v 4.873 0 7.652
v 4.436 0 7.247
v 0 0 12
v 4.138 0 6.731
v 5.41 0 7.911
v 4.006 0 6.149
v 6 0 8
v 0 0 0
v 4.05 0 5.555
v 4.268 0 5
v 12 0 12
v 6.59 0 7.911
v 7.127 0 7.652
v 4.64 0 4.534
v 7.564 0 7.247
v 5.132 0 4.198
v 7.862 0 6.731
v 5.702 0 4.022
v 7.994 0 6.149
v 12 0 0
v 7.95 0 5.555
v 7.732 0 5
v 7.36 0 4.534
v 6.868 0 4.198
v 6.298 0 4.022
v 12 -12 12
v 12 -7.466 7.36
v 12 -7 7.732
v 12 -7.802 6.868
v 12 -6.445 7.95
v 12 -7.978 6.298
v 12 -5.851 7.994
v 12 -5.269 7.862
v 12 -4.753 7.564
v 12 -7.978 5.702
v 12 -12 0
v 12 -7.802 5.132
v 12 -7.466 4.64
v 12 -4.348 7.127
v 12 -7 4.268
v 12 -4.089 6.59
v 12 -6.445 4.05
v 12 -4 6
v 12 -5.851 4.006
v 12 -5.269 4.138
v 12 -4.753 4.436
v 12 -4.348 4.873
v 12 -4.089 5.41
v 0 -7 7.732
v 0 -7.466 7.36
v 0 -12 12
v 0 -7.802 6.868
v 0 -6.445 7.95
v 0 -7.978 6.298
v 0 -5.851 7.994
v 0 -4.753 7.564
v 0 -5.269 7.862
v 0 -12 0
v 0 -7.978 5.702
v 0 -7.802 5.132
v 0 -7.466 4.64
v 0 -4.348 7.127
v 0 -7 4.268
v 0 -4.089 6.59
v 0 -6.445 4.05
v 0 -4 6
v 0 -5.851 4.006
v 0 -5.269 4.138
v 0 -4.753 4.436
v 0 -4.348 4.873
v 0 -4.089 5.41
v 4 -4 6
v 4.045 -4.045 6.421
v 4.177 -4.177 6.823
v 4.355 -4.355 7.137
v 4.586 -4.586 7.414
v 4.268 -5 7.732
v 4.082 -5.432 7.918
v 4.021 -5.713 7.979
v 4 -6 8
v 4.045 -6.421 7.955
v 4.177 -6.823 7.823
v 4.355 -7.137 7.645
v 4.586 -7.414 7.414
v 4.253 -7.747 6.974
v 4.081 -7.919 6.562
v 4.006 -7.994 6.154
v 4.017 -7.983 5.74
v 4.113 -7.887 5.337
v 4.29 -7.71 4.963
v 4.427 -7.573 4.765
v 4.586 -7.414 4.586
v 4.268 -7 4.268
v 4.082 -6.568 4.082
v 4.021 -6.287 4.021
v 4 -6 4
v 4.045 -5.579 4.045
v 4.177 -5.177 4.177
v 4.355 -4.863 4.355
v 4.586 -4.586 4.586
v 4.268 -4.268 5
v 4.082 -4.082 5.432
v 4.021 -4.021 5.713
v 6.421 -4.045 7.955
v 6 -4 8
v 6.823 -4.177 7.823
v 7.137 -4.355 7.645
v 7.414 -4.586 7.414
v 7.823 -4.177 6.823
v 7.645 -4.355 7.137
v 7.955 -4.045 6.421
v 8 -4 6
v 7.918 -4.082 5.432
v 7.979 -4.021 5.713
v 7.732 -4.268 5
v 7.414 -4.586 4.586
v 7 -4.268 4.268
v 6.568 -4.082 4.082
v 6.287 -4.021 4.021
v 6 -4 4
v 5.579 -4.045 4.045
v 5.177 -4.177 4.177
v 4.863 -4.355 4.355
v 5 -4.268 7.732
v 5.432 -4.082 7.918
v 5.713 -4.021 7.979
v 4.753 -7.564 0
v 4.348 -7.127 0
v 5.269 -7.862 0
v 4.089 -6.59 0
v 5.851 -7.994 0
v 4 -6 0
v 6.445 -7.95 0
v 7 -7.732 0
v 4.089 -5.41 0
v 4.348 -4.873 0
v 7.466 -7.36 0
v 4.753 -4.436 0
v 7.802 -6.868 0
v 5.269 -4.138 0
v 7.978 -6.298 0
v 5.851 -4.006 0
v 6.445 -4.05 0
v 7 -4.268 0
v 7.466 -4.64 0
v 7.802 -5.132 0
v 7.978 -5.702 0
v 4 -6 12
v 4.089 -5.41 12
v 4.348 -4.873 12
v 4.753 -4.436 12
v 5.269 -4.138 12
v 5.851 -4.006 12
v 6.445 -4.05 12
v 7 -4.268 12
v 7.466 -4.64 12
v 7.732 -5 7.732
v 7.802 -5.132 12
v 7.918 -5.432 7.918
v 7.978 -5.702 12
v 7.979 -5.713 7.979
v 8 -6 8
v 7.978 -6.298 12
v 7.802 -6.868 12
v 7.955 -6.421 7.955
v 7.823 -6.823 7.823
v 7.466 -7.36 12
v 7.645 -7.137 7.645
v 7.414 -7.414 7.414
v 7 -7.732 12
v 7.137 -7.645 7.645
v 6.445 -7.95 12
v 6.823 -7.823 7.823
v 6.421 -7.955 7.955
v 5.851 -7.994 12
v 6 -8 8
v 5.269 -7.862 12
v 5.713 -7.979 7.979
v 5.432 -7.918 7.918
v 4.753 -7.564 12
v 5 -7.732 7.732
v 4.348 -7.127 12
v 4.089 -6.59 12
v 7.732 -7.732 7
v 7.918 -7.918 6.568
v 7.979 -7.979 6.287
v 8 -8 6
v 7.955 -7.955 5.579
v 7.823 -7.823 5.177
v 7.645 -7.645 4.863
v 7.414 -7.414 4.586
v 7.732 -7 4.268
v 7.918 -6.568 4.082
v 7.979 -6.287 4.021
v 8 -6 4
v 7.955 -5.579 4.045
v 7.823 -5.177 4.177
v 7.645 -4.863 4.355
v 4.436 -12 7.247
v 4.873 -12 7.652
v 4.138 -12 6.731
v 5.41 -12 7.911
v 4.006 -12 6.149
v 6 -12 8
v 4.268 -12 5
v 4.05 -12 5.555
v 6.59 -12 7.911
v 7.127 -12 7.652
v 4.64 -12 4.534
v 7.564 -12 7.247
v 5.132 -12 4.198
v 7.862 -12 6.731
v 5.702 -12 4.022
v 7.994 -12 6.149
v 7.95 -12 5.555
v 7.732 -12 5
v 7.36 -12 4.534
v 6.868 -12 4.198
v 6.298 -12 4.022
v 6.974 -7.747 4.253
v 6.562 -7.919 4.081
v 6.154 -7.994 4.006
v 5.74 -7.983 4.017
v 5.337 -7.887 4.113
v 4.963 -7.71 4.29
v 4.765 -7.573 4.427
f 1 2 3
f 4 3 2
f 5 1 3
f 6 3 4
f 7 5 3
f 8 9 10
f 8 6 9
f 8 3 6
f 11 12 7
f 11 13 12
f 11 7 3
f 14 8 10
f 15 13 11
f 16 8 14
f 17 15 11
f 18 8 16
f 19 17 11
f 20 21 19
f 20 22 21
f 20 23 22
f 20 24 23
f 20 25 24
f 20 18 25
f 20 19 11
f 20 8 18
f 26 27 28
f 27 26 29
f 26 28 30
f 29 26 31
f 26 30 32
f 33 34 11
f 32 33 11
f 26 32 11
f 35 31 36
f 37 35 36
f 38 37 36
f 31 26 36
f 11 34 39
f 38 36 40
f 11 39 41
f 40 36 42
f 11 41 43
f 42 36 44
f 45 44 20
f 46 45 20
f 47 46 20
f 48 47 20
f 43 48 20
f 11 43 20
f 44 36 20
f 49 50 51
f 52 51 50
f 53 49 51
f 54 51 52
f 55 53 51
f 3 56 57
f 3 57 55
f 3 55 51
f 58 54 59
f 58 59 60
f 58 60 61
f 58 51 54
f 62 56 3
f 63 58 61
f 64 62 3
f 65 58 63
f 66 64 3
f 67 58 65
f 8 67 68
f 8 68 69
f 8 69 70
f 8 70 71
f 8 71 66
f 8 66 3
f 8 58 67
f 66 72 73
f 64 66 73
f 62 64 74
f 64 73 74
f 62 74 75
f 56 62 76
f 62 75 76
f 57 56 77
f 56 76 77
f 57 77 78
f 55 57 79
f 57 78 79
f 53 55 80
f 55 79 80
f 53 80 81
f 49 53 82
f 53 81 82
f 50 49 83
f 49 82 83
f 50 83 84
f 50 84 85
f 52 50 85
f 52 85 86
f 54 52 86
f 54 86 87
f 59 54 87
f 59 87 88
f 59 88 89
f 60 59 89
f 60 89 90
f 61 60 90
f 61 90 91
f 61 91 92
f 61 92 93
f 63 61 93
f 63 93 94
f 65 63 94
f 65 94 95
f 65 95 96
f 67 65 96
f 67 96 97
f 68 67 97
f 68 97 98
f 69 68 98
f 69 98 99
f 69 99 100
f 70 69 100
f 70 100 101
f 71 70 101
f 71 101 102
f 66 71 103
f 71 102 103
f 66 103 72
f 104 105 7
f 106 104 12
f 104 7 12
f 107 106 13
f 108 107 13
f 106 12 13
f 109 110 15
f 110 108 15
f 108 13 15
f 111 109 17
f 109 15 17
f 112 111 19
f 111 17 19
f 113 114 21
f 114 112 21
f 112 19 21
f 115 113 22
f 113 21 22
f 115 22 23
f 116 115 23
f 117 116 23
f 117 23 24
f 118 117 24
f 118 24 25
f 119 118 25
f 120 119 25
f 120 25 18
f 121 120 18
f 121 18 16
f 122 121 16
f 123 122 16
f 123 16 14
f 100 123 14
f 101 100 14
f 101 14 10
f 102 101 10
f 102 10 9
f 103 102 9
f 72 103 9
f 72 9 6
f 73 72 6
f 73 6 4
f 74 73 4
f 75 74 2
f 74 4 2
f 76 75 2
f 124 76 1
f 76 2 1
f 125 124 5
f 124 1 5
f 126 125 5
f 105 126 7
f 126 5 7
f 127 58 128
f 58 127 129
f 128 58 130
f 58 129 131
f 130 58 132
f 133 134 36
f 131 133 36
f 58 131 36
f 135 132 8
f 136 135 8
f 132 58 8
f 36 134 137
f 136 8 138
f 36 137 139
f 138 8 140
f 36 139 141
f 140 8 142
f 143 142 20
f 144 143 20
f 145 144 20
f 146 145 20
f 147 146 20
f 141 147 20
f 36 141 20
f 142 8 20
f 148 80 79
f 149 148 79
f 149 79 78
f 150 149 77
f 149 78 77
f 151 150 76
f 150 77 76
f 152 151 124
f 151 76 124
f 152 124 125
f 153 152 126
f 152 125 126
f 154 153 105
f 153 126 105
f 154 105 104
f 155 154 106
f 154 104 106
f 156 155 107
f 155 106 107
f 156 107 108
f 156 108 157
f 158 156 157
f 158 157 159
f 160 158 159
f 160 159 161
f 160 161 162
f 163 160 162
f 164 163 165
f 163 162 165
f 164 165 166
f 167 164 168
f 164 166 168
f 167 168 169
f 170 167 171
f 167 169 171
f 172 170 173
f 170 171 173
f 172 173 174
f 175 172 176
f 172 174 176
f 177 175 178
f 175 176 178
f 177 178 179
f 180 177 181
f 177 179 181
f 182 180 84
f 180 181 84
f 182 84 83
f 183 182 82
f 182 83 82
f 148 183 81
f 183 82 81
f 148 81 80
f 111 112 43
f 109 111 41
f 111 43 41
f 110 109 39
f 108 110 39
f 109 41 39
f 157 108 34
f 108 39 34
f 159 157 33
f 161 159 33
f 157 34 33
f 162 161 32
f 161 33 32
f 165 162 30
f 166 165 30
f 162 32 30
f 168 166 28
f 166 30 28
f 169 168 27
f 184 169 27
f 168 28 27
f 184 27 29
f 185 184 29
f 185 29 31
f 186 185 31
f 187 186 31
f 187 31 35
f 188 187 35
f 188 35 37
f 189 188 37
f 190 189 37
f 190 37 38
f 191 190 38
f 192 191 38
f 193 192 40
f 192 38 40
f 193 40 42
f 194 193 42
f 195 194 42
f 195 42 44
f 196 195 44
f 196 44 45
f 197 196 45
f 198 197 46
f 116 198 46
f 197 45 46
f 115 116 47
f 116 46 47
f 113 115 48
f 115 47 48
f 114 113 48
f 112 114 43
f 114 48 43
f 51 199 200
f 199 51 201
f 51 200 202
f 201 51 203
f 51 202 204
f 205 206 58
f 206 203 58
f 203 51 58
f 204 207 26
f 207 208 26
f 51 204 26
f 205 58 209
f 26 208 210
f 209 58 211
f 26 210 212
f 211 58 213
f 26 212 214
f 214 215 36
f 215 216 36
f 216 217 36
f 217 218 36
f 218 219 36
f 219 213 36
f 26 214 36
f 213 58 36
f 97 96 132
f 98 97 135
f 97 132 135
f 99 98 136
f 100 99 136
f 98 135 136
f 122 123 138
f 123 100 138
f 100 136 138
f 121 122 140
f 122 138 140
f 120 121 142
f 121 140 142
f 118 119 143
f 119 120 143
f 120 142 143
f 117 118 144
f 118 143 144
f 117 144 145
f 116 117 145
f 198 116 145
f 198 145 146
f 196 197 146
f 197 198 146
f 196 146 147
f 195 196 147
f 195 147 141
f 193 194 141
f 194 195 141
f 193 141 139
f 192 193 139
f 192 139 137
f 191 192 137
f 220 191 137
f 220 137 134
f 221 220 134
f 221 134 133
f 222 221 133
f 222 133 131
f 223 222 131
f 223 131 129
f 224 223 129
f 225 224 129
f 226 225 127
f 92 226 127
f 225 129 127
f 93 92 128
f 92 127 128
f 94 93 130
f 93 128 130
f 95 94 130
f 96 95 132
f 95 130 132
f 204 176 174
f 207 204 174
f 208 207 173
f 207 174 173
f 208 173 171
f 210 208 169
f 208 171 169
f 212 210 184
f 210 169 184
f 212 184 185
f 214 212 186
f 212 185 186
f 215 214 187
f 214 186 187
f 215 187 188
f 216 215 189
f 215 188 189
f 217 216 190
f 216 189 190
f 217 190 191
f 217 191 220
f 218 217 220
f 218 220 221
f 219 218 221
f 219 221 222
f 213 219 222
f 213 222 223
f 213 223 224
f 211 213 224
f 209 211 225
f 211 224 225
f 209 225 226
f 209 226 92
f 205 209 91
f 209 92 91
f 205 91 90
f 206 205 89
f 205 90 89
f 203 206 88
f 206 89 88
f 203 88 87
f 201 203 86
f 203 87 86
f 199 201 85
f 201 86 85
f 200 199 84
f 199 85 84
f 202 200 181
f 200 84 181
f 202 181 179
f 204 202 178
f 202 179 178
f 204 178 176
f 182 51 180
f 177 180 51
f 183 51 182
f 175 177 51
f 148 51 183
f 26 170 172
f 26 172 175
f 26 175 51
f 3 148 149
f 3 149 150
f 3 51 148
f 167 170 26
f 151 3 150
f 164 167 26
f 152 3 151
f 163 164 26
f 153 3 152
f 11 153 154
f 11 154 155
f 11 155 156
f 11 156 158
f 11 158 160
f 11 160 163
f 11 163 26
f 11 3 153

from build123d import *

# Parameters (mm, degrees)
SKETCH_1_W          = 12
SKETCH_1_H          = 12
EXTRUDE_1_DEPTH     = 12
SKETCH_2_R          = 2
CUT_EXTRUDE_1_DEPTH = 21.784609691
SKETCH_3_R          = 2
CUT_EXTRUDE_2_DEPTH = 21.784609691
SKETCH_4_R          = 2
CUT_EXTRUDE_3_DEPTH = 21.784609691


with BuildPart() as part:
    # 草图1 → 凸台-拉伸1 (new body)
    with BuildSketch(Plane.XY):
        with Locations((6, -6)):
            Rectangle(SKETCH_1_W, SKETCH_1_H)
    extrude(amount=EXTRUDE_1_DEPTH)

    # 草图2 → 切除-拉伸1 (cut, through all)
    with BuildSketch(Plane(origin=(12, 0, 0), x_dir=(0, 0, -1), z_dir=(1, 0, 0))):
        with Locations(Location((-6, -6, 0), (0, 0, 90))):
            Circle(SKETCH_2_R)
    extrude(amount=-CUT_EXTRUDE_1_DEPTH, mode=Mode.SUBTRACT)

    # 草图3 → 切除-拉伸2 (cut, through all)
    with BuildSketch(Plane(origin=(0, 0, 0), x_dir=(1, 0, 0), z_dir=(0, 1, 0))):
        with Locations(Location((6, -6, 0), (0, 0, 270))):
            Circle(SKETCH_3_R)
    extrude(amount=-CUT_EXTRUDE_2_DEPTH, mode=Mode.SUBTRACT)

    # 草图4 → 切除-拉伸3 (cut, through all)
    with BuildSketch(Plane(origin=(0, 0, 0), x_dir=(-1, 0, 0), z_dir=(0, 0, -1))):
        with Locations((-6, -6)):
            Circle(SKETCH_4_R)
    extrude(amount=-CUT_EXTRUDE_3_DEPTH, mode=Mode.SUBTRACT)


solid = part.part
